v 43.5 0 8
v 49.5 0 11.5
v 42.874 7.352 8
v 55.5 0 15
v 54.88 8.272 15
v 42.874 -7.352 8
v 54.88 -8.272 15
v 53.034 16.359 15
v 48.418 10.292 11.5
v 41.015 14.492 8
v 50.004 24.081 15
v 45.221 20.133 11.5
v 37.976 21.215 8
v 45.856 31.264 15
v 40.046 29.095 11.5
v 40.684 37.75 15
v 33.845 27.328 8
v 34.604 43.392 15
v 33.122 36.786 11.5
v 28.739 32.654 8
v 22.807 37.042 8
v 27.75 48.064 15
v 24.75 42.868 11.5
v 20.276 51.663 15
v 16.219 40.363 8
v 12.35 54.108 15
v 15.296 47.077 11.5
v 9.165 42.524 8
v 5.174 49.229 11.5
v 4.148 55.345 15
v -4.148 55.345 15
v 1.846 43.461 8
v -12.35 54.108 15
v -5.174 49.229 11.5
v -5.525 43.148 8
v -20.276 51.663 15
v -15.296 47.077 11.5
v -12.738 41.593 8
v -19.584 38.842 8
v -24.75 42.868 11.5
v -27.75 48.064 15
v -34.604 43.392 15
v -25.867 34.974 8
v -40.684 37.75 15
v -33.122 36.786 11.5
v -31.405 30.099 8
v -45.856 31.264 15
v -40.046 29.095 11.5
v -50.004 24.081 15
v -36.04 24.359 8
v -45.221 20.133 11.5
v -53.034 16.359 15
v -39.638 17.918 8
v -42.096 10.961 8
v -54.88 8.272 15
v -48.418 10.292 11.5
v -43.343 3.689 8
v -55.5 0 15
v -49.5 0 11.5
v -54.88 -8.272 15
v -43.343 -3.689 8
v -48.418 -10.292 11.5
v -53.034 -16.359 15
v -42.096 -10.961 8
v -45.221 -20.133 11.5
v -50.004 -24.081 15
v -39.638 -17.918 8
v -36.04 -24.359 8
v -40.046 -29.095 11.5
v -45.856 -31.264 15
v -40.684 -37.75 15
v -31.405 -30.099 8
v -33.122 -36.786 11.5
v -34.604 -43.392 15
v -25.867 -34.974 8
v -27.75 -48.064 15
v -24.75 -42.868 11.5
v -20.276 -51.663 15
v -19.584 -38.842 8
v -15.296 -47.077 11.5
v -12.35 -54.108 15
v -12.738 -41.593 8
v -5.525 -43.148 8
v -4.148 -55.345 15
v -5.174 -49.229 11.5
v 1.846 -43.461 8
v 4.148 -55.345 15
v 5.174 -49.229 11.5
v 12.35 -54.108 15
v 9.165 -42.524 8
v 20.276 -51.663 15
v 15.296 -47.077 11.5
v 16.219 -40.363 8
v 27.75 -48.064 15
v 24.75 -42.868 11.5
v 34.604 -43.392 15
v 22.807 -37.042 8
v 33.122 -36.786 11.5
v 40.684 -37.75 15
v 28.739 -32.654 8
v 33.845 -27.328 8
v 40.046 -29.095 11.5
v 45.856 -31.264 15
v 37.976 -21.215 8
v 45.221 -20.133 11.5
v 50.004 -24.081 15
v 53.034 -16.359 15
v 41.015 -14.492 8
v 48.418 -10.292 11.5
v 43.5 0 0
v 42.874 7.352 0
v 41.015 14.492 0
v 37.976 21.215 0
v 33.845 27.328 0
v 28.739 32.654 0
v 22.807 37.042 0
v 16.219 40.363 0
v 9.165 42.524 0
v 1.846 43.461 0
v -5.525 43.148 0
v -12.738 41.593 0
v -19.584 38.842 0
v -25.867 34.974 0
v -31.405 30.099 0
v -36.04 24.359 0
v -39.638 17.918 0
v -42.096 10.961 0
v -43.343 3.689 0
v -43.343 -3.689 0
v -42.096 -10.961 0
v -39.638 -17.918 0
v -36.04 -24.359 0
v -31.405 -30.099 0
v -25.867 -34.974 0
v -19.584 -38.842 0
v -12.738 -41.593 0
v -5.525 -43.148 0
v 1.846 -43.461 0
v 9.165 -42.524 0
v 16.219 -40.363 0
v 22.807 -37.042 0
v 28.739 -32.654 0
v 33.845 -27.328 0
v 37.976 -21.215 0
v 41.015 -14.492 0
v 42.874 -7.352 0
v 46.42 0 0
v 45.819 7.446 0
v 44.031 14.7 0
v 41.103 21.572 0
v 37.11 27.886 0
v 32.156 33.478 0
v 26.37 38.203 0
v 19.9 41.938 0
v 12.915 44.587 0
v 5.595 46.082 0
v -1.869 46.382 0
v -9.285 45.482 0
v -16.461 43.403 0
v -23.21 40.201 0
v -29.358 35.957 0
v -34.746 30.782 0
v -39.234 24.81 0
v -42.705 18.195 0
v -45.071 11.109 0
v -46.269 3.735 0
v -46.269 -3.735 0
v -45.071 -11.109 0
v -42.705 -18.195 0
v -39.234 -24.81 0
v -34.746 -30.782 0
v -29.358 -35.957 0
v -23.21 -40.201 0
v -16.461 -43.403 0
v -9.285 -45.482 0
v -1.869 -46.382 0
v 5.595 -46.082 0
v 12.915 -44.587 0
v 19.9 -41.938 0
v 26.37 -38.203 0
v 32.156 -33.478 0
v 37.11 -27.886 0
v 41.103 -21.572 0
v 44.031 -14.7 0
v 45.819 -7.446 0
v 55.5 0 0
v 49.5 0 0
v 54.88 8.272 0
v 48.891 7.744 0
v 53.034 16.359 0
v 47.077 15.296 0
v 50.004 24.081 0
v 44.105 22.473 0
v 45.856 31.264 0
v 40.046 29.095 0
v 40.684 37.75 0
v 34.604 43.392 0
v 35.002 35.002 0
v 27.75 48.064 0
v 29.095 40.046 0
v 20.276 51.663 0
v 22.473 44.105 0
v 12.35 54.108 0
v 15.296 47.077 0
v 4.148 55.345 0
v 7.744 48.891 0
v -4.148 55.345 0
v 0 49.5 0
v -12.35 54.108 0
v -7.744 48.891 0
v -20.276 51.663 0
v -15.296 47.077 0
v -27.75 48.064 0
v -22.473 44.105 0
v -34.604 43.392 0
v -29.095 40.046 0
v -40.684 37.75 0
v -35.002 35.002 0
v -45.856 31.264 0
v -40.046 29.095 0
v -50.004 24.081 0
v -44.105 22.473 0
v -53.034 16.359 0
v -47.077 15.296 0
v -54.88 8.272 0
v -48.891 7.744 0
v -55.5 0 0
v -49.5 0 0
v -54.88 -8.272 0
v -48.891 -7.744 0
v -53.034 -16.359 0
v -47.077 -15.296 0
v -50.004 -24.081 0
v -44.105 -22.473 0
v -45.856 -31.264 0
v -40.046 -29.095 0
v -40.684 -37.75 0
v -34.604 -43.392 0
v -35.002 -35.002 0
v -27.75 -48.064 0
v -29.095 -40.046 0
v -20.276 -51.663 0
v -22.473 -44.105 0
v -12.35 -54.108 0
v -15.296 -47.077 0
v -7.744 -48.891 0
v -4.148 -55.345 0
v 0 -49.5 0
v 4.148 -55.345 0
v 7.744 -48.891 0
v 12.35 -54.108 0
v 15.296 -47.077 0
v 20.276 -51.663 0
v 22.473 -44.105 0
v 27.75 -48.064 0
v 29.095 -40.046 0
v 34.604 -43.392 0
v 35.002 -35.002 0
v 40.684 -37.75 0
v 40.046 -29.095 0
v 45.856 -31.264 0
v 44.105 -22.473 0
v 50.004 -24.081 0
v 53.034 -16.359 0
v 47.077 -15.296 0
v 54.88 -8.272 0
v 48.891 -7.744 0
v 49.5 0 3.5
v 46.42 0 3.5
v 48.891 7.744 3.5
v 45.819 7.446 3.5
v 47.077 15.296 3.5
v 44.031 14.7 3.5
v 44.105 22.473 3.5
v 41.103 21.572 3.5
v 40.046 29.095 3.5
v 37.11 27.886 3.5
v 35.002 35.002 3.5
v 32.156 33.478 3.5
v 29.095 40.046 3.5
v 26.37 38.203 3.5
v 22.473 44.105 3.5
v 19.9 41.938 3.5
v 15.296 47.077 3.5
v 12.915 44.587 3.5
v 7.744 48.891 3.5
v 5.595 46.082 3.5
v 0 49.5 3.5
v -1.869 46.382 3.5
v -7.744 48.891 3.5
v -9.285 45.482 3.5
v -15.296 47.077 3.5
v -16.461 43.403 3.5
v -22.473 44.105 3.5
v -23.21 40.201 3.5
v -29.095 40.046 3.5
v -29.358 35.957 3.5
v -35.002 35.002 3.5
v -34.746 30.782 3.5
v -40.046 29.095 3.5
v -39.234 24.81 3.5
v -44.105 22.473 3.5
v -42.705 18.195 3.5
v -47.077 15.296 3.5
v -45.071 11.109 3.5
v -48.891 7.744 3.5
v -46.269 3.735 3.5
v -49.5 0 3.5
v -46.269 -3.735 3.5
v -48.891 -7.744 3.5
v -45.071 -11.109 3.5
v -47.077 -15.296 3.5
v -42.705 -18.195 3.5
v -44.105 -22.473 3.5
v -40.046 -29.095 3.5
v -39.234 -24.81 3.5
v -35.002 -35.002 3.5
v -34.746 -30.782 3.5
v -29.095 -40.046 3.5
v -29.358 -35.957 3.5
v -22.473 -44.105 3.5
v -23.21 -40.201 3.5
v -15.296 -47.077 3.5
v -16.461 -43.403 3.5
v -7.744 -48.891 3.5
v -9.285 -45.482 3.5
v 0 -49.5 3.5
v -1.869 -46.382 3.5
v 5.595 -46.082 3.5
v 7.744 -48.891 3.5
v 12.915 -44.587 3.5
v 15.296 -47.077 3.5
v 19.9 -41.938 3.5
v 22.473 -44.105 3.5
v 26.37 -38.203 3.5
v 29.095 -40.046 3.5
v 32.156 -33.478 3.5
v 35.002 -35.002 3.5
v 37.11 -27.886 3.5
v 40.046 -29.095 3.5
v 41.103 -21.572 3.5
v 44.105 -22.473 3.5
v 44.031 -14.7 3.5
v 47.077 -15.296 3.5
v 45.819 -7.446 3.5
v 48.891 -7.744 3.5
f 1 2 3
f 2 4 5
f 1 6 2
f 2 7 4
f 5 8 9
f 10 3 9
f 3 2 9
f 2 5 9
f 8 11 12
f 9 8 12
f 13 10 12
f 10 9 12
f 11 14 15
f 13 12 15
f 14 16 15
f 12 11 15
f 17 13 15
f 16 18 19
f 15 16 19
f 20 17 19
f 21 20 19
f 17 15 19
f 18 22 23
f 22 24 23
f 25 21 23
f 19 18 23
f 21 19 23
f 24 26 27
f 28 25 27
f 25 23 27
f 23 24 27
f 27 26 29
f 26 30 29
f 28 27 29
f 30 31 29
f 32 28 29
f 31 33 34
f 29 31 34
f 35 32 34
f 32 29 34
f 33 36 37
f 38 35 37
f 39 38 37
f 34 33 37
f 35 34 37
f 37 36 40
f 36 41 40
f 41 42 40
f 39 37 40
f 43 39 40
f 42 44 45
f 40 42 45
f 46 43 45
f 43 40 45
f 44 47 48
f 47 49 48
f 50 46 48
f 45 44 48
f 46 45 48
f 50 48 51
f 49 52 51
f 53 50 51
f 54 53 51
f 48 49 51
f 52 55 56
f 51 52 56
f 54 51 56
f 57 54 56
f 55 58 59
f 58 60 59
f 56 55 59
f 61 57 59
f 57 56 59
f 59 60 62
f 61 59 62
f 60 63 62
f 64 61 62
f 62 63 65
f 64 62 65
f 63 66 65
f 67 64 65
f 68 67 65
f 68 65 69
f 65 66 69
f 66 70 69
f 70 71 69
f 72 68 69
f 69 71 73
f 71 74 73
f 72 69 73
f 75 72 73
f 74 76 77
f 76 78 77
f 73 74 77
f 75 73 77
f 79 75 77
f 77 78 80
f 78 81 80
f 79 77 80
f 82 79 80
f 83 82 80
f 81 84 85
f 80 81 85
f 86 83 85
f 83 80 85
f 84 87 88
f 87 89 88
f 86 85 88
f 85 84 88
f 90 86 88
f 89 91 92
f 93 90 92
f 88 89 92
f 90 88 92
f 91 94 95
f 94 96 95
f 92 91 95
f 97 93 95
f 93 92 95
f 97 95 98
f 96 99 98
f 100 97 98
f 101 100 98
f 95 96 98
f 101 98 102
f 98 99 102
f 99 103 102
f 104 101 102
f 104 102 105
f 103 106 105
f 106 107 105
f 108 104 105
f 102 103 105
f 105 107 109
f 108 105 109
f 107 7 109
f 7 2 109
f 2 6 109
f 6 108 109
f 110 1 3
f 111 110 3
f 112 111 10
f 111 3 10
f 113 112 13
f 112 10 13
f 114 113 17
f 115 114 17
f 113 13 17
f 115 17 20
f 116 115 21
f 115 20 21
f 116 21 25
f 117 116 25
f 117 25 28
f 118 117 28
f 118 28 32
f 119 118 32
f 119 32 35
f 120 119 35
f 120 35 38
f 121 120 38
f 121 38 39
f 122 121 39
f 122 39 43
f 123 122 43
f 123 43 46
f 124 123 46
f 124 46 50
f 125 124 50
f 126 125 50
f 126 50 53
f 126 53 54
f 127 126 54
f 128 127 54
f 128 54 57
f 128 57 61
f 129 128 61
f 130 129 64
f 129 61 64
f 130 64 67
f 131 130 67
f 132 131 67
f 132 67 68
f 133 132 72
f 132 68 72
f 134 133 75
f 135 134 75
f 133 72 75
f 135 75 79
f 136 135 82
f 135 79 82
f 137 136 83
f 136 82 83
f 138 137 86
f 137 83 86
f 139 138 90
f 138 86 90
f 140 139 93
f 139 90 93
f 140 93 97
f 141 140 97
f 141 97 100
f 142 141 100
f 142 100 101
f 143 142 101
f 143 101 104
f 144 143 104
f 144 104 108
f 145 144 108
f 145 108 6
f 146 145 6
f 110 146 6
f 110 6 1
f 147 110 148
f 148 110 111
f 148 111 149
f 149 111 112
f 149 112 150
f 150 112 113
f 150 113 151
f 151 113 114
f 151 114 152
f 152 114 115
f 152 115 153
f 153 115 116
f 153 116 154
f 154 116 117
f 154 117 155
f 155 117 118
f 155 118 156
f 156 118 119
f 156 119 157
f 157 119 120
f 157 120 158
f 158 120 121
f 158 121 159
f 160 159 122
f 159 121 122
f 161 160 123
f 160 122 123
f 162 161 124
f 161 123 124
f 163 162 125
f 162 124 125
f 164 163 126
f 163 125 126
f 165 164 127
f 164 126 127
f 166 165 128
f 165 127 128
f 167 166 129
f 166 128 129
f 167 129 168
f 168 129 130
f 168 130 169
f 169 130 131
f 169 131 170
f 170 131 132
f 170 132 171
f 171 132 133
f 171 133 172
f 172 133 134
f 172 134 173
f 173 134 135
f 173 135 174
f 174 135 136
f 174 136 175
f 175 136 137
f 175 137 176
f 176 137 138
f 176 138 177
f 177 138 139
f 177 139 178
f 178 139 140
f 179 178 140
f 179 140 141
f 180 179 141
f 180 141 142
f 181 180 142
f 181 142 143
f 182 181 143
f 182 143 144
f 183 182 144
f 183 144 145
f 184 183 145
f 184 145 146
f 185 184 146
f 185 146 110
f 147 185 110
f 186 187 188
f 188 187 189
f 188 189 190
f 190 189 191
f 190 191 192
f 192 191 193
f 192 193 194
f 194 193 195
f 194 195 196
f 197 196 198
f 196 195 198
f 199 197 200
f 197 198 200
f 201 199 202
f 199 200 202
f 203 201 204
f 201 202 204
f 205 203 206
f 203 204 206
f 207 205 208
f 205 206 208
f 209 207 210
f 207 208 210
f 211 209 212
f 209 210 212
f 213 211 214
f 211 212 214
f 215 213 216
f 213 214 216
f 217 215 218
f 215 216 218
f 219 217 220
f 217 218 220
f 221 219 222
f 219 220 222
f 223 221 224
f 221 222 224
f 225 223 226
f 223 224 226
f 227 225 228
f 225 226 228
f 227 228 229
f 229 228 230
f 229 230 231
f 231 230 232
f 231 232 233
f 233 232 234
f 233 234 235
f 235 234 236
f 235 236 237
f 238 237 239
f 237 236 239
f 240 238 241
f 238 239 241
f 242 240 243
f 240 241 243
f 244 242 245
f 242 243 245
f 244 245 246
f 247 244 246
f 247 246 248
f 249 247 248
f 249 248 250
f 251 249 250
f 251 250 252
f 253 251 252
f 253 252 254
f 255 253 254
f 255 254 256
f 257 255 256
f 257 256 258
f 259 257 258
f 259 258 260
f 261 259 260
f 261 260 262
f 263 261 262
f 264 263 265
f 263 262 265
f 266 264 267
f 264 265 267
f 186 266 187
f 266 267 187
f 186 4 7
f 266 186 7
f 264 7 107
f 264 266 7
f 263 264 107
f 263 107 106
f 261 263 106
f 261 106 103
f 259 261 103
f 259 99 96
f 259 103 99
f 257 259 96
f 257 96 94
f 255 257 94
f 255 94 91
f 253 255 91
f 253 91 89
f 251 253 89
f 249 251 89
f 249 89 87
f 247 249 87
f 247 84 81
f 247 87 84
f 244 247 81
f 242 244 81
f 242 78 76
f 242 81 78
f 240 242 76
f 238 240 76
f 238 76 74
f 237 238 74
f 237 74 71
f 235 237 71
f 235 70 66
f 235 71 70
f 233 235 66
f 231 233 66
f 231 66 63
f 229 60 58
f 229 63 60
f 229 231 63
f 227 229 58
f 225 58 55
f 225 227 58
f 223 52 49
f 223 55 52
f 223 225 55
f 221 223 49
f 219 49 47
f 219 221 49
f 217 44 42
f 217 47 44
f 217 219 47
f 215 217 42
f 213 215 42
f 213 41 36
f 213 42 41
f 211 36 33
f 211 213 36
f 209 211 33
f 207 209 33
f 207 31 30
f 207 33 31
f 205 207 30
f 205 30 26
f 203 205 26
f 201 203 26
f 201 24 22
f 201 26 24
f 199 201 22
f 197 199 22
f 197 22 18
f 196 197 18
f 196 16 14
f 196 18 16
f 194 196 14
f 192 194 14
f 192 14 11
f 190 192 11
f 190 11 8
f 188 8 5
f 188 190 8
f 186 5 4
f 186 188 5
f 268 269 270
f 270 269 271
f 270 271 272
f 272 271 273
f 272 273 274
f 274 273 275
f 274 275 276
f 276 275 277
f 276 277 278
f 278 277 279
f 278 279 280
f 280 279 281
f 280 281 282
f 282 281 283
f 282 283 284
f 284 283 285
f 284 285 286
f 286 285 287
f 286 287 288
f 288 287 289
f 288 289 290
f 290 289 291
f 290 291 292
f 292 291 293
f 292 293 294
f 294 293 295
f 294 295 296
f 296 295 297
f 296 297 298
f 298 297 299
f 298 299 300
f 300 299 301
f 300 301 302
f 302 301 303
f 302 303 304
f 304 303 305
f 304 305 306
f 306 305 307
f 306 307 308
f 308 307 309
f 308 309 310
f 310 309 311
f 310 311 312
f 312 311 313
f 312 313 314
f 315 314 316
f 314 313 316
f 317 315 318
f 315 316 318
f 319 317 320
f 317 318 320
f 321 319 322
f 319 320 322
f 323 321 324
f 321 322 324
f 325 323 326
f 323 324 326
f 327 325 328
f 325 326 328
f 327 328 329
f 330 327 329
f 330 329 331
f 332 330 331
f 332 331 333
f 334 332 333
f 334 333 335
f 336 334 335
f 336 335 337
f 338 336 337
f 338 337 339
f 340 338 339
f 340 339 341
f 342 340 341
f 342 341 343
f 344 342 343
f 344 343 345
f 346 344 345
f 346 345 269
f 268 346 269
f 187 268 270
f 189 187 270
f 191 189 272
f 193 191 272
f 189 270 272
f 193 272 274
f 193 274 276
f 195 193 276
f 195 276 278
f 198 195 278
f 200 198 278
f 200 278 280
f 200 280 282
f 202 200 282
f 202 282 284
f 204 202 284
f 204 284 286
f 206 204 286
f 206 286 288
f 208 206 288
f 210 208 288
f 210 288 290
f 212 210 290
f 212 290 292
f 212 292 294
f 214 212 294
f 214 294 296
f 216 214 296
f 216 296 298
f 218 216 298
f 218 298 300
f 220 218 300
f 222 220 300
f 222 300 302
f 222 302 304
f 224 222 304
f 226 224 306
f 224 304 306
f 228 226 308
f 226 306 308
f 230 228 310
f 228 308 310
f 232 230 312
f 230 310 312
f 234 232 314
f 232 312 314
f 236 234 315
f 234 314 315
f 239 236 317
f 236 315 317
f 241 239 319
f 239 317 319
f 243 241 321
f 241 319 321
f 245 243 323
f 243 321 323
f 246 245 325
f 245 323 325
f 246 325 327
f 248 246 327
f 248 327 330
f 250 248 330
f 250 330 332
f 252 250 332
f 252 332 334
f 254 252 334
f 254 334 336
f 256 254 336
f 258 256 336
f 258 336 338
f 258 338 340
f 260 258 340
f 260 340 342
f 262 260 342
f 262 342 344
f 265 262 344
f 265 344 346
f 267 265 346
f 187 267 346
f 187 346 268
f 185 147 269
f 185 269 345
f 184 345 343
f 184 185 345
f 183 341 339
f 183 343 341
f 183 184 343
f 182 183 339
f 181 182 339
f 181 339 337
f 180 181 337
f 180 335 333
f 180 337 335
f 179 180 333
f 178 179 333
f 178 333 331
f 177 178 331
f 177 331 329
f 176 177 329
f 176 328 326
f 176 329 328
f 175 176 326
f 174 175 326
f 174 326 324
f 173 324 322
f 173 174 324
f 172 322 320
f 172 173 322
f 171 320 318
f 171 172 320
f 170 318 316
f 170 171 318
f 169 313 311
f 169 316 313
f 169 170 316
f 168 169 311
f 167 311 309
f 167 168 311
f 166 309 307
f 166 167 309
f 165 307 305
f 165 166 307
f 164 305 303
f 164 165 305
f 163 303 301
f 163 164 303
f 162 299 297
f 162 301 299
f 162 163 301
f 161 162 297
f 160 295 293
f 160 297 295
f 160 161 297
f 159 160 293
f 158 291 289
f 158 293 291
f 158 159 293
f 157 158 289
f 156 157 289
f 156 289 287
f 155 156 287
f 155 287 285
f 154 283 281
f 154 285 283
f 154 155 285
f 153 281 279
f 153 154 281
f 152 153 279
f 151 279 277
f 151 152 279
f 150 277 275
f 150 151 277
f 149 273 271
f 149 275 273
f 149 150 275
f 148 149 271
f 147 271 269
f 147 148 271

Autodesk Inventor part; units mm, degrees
ref_plane "YZ Plane" through (0, 0, 0) normal (1, 0, 0) x (0, 1, 0)
ref_plane "XZ Plane" through (0, 0, 0) normal (0, 1, 0) x (-1, 0, 0)
ref_plane "XY Plane" through (0, 0, 0) normal (0, 0, 1) x (1, 0, 0)
sketch "Sketch3" plane through (0, 0, 0) normal (0, 0, 1) x (1, 0, 0)
  circle A0 centre (0, 0) radius 55.5
  dimension "d5" = 111
sketch "Sketch4" plane through (0, 0, 0) normal (1, 0, 0) x (0, 1, 0)
  line L0 (55.5, 0) -> (-55.5, 0) construction
  line L1 (-55.5, 0) -> (-55.5, 15)
  line L2 (-55.5, 0) -> (-40.5, 0) construction
  line L3 (-55.5, 0) -> (-49.5, 0) construction
  line L4 (-49.5, 0) -> (-49.5, 3.5)
  line L5 (-49.5, 3.5) -> (-46.42, 3.5)
  line L6 (-49.5, 3.5) -> (-46.42, 3.5) construction
  line L7 (-46.42, 3.5) -> (-46.42, 0)
  line L8 (-46.42, 3.5) -> (-42.92, 3.5) construction
  line L9 (-46.42, 0) -> (-43.5, 0)
  line L10 (-43.5, 0) -> (-43.5, 8)
  line L11 (-43.5, 8) -> (-55.5, 15)
  line L12 (-55.5, 0) -> (-49.5, 0)
  line L13 (-49.5, 0) -> (-49.5, 3.5)
  line L14 (-43.5, 0) -> (-43.5, 8)
  line L15 (-43.5, 8) -> (-55.5, 15)
  line L16 (-55.5, 0) -> (-49.5, 0)
  line L17 (-49.5, 0) -> (-49.5, 3.5)
  line L18 (-46.42, 3.5) -> (-49.5, 3.5)
  line L19 (-46.42, 3.5) -> (-46.42, 0)
  line L20 (-46.42, 0) -> (-43.5, 0)
  point P0 (0, 0)
  dimension "d6" = 15
  dimension "d7" = 90
  dimension "d9" = 3.5
  dimension "d10" = 90
  dimension "d11" = 3.08
  dimension "d12" = 0
  dimension "d13" = 90
  dimension "d15" = 8
  dimension "d18" = 12
  dimension "d19" = 6
sweep "Sweep1" add profiles "Sketch4" path "Sketch3"
properties part number "Shaft"
